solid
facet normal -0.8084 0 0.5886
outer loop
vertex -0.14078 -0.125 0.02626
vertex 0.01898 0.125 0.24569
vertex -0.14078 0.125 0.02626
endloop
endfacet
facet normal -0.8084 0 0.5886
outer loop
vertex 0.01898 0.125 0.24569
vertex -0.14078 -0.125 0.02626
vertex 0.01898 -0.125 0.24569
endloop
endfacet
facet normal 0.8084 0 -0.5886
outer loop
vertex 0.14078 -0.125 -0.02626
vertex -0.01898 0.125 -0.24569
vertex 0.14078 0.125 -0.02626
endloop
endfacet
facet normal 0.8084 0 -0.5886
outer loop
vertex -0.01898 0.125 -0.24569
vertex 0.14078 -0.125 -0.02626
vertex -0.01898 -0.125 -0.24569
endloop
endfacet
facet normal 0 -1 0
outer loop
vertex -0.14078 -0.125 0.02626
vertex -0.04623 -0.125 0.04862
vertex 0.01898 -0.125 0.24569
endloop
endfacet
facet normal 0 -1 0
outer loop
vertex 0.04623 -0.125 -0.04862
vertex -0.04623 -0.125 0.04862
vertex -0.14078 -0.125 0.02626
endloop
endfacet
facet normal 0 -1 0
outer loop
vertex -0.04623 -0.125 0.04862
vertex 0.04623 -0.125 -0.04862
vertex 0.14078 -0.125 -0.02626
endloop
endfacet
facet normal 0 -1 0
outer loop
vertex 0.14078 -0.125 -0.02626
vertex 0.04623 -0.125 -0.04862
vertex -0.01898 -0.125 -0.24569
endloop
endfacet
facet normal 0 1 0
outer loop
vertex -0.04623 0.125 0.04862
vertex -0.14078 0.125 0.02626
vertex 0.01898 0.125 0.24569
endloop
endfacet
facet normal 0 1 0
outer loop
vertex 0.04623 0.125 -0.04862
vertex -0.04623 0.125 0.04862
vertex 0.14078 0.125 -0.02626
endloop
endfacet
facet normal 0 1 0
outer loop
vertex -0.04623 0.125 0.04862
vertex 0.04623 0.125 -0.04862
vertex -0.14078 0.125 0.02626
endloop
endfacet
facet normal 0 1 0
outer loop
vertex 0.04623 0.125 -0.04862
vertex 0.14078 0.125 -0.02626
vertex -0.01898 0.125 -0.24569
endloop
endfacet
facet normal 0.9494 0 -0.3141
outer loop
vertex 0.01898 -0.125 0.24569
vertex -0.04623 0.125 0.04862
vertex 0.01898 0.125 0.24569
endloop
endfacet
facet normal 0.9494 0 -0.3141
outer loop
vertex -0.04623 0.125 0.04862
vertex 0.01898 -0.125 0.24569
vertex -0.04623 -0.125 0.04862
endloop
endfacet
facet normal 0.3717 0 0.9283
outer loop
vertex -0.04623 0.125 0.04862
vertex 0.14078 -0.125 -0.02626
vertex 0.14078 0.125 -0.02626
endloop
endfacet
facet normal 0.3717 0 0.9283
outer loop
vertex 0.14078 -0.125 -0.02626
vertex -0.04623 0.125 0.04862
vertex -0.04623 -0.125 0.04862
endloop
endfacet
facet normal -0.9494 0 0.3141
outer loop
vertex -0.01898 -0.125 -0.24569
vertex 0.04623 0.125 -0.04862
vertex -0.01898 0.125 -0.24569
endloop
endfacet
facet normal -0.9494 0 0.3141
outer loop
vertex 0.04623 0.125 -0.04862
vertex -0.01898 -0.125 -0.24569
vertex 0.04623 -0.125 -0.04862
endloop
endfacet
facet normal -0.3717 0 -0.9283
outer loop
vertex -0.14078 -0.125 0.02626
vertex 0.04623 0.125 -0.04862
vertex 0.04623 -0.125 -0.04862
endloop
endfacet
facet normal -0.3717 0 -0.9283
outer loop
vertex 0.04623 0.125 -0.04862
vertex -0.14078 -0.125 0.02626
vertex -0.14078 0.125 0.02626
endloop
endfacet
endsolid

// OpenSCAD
use <lib.scad>

module triangle($fn=16) {
	radius=0.1;
	thick=0.2;
	bumpA=0.4-radius;
	bumpB=0.3-radius;
	rotate([90,0,0]) hull() {
		translate([-bumpA,-bumpB,0]) cyl(radius, radius, thick);
		translate([bumpA,-bumpB,0]) cyl(radius, radius, thick);
		translate([0,bumpA,0]) cyl(radius, radius, thick);
	}
}

module bolt() {
	scale([1,1,1.1]) rotate([0,5,0]) rotate([90,0,0]) difference() {
		scale([1,1.5,1]) cyl(0.15,0.15,0.25,$fn=4);
		translate([0.08,0.115,0]) rotate([0,0,30]) cyl(0.15,0.15,0.35,$fn=4);
		translate([-0.08,-0.115,0]) rotate([0,0,30]) cyl(0.15,0.15,0.35,$fn=4);
	}
}

//triangle();
bolt();
